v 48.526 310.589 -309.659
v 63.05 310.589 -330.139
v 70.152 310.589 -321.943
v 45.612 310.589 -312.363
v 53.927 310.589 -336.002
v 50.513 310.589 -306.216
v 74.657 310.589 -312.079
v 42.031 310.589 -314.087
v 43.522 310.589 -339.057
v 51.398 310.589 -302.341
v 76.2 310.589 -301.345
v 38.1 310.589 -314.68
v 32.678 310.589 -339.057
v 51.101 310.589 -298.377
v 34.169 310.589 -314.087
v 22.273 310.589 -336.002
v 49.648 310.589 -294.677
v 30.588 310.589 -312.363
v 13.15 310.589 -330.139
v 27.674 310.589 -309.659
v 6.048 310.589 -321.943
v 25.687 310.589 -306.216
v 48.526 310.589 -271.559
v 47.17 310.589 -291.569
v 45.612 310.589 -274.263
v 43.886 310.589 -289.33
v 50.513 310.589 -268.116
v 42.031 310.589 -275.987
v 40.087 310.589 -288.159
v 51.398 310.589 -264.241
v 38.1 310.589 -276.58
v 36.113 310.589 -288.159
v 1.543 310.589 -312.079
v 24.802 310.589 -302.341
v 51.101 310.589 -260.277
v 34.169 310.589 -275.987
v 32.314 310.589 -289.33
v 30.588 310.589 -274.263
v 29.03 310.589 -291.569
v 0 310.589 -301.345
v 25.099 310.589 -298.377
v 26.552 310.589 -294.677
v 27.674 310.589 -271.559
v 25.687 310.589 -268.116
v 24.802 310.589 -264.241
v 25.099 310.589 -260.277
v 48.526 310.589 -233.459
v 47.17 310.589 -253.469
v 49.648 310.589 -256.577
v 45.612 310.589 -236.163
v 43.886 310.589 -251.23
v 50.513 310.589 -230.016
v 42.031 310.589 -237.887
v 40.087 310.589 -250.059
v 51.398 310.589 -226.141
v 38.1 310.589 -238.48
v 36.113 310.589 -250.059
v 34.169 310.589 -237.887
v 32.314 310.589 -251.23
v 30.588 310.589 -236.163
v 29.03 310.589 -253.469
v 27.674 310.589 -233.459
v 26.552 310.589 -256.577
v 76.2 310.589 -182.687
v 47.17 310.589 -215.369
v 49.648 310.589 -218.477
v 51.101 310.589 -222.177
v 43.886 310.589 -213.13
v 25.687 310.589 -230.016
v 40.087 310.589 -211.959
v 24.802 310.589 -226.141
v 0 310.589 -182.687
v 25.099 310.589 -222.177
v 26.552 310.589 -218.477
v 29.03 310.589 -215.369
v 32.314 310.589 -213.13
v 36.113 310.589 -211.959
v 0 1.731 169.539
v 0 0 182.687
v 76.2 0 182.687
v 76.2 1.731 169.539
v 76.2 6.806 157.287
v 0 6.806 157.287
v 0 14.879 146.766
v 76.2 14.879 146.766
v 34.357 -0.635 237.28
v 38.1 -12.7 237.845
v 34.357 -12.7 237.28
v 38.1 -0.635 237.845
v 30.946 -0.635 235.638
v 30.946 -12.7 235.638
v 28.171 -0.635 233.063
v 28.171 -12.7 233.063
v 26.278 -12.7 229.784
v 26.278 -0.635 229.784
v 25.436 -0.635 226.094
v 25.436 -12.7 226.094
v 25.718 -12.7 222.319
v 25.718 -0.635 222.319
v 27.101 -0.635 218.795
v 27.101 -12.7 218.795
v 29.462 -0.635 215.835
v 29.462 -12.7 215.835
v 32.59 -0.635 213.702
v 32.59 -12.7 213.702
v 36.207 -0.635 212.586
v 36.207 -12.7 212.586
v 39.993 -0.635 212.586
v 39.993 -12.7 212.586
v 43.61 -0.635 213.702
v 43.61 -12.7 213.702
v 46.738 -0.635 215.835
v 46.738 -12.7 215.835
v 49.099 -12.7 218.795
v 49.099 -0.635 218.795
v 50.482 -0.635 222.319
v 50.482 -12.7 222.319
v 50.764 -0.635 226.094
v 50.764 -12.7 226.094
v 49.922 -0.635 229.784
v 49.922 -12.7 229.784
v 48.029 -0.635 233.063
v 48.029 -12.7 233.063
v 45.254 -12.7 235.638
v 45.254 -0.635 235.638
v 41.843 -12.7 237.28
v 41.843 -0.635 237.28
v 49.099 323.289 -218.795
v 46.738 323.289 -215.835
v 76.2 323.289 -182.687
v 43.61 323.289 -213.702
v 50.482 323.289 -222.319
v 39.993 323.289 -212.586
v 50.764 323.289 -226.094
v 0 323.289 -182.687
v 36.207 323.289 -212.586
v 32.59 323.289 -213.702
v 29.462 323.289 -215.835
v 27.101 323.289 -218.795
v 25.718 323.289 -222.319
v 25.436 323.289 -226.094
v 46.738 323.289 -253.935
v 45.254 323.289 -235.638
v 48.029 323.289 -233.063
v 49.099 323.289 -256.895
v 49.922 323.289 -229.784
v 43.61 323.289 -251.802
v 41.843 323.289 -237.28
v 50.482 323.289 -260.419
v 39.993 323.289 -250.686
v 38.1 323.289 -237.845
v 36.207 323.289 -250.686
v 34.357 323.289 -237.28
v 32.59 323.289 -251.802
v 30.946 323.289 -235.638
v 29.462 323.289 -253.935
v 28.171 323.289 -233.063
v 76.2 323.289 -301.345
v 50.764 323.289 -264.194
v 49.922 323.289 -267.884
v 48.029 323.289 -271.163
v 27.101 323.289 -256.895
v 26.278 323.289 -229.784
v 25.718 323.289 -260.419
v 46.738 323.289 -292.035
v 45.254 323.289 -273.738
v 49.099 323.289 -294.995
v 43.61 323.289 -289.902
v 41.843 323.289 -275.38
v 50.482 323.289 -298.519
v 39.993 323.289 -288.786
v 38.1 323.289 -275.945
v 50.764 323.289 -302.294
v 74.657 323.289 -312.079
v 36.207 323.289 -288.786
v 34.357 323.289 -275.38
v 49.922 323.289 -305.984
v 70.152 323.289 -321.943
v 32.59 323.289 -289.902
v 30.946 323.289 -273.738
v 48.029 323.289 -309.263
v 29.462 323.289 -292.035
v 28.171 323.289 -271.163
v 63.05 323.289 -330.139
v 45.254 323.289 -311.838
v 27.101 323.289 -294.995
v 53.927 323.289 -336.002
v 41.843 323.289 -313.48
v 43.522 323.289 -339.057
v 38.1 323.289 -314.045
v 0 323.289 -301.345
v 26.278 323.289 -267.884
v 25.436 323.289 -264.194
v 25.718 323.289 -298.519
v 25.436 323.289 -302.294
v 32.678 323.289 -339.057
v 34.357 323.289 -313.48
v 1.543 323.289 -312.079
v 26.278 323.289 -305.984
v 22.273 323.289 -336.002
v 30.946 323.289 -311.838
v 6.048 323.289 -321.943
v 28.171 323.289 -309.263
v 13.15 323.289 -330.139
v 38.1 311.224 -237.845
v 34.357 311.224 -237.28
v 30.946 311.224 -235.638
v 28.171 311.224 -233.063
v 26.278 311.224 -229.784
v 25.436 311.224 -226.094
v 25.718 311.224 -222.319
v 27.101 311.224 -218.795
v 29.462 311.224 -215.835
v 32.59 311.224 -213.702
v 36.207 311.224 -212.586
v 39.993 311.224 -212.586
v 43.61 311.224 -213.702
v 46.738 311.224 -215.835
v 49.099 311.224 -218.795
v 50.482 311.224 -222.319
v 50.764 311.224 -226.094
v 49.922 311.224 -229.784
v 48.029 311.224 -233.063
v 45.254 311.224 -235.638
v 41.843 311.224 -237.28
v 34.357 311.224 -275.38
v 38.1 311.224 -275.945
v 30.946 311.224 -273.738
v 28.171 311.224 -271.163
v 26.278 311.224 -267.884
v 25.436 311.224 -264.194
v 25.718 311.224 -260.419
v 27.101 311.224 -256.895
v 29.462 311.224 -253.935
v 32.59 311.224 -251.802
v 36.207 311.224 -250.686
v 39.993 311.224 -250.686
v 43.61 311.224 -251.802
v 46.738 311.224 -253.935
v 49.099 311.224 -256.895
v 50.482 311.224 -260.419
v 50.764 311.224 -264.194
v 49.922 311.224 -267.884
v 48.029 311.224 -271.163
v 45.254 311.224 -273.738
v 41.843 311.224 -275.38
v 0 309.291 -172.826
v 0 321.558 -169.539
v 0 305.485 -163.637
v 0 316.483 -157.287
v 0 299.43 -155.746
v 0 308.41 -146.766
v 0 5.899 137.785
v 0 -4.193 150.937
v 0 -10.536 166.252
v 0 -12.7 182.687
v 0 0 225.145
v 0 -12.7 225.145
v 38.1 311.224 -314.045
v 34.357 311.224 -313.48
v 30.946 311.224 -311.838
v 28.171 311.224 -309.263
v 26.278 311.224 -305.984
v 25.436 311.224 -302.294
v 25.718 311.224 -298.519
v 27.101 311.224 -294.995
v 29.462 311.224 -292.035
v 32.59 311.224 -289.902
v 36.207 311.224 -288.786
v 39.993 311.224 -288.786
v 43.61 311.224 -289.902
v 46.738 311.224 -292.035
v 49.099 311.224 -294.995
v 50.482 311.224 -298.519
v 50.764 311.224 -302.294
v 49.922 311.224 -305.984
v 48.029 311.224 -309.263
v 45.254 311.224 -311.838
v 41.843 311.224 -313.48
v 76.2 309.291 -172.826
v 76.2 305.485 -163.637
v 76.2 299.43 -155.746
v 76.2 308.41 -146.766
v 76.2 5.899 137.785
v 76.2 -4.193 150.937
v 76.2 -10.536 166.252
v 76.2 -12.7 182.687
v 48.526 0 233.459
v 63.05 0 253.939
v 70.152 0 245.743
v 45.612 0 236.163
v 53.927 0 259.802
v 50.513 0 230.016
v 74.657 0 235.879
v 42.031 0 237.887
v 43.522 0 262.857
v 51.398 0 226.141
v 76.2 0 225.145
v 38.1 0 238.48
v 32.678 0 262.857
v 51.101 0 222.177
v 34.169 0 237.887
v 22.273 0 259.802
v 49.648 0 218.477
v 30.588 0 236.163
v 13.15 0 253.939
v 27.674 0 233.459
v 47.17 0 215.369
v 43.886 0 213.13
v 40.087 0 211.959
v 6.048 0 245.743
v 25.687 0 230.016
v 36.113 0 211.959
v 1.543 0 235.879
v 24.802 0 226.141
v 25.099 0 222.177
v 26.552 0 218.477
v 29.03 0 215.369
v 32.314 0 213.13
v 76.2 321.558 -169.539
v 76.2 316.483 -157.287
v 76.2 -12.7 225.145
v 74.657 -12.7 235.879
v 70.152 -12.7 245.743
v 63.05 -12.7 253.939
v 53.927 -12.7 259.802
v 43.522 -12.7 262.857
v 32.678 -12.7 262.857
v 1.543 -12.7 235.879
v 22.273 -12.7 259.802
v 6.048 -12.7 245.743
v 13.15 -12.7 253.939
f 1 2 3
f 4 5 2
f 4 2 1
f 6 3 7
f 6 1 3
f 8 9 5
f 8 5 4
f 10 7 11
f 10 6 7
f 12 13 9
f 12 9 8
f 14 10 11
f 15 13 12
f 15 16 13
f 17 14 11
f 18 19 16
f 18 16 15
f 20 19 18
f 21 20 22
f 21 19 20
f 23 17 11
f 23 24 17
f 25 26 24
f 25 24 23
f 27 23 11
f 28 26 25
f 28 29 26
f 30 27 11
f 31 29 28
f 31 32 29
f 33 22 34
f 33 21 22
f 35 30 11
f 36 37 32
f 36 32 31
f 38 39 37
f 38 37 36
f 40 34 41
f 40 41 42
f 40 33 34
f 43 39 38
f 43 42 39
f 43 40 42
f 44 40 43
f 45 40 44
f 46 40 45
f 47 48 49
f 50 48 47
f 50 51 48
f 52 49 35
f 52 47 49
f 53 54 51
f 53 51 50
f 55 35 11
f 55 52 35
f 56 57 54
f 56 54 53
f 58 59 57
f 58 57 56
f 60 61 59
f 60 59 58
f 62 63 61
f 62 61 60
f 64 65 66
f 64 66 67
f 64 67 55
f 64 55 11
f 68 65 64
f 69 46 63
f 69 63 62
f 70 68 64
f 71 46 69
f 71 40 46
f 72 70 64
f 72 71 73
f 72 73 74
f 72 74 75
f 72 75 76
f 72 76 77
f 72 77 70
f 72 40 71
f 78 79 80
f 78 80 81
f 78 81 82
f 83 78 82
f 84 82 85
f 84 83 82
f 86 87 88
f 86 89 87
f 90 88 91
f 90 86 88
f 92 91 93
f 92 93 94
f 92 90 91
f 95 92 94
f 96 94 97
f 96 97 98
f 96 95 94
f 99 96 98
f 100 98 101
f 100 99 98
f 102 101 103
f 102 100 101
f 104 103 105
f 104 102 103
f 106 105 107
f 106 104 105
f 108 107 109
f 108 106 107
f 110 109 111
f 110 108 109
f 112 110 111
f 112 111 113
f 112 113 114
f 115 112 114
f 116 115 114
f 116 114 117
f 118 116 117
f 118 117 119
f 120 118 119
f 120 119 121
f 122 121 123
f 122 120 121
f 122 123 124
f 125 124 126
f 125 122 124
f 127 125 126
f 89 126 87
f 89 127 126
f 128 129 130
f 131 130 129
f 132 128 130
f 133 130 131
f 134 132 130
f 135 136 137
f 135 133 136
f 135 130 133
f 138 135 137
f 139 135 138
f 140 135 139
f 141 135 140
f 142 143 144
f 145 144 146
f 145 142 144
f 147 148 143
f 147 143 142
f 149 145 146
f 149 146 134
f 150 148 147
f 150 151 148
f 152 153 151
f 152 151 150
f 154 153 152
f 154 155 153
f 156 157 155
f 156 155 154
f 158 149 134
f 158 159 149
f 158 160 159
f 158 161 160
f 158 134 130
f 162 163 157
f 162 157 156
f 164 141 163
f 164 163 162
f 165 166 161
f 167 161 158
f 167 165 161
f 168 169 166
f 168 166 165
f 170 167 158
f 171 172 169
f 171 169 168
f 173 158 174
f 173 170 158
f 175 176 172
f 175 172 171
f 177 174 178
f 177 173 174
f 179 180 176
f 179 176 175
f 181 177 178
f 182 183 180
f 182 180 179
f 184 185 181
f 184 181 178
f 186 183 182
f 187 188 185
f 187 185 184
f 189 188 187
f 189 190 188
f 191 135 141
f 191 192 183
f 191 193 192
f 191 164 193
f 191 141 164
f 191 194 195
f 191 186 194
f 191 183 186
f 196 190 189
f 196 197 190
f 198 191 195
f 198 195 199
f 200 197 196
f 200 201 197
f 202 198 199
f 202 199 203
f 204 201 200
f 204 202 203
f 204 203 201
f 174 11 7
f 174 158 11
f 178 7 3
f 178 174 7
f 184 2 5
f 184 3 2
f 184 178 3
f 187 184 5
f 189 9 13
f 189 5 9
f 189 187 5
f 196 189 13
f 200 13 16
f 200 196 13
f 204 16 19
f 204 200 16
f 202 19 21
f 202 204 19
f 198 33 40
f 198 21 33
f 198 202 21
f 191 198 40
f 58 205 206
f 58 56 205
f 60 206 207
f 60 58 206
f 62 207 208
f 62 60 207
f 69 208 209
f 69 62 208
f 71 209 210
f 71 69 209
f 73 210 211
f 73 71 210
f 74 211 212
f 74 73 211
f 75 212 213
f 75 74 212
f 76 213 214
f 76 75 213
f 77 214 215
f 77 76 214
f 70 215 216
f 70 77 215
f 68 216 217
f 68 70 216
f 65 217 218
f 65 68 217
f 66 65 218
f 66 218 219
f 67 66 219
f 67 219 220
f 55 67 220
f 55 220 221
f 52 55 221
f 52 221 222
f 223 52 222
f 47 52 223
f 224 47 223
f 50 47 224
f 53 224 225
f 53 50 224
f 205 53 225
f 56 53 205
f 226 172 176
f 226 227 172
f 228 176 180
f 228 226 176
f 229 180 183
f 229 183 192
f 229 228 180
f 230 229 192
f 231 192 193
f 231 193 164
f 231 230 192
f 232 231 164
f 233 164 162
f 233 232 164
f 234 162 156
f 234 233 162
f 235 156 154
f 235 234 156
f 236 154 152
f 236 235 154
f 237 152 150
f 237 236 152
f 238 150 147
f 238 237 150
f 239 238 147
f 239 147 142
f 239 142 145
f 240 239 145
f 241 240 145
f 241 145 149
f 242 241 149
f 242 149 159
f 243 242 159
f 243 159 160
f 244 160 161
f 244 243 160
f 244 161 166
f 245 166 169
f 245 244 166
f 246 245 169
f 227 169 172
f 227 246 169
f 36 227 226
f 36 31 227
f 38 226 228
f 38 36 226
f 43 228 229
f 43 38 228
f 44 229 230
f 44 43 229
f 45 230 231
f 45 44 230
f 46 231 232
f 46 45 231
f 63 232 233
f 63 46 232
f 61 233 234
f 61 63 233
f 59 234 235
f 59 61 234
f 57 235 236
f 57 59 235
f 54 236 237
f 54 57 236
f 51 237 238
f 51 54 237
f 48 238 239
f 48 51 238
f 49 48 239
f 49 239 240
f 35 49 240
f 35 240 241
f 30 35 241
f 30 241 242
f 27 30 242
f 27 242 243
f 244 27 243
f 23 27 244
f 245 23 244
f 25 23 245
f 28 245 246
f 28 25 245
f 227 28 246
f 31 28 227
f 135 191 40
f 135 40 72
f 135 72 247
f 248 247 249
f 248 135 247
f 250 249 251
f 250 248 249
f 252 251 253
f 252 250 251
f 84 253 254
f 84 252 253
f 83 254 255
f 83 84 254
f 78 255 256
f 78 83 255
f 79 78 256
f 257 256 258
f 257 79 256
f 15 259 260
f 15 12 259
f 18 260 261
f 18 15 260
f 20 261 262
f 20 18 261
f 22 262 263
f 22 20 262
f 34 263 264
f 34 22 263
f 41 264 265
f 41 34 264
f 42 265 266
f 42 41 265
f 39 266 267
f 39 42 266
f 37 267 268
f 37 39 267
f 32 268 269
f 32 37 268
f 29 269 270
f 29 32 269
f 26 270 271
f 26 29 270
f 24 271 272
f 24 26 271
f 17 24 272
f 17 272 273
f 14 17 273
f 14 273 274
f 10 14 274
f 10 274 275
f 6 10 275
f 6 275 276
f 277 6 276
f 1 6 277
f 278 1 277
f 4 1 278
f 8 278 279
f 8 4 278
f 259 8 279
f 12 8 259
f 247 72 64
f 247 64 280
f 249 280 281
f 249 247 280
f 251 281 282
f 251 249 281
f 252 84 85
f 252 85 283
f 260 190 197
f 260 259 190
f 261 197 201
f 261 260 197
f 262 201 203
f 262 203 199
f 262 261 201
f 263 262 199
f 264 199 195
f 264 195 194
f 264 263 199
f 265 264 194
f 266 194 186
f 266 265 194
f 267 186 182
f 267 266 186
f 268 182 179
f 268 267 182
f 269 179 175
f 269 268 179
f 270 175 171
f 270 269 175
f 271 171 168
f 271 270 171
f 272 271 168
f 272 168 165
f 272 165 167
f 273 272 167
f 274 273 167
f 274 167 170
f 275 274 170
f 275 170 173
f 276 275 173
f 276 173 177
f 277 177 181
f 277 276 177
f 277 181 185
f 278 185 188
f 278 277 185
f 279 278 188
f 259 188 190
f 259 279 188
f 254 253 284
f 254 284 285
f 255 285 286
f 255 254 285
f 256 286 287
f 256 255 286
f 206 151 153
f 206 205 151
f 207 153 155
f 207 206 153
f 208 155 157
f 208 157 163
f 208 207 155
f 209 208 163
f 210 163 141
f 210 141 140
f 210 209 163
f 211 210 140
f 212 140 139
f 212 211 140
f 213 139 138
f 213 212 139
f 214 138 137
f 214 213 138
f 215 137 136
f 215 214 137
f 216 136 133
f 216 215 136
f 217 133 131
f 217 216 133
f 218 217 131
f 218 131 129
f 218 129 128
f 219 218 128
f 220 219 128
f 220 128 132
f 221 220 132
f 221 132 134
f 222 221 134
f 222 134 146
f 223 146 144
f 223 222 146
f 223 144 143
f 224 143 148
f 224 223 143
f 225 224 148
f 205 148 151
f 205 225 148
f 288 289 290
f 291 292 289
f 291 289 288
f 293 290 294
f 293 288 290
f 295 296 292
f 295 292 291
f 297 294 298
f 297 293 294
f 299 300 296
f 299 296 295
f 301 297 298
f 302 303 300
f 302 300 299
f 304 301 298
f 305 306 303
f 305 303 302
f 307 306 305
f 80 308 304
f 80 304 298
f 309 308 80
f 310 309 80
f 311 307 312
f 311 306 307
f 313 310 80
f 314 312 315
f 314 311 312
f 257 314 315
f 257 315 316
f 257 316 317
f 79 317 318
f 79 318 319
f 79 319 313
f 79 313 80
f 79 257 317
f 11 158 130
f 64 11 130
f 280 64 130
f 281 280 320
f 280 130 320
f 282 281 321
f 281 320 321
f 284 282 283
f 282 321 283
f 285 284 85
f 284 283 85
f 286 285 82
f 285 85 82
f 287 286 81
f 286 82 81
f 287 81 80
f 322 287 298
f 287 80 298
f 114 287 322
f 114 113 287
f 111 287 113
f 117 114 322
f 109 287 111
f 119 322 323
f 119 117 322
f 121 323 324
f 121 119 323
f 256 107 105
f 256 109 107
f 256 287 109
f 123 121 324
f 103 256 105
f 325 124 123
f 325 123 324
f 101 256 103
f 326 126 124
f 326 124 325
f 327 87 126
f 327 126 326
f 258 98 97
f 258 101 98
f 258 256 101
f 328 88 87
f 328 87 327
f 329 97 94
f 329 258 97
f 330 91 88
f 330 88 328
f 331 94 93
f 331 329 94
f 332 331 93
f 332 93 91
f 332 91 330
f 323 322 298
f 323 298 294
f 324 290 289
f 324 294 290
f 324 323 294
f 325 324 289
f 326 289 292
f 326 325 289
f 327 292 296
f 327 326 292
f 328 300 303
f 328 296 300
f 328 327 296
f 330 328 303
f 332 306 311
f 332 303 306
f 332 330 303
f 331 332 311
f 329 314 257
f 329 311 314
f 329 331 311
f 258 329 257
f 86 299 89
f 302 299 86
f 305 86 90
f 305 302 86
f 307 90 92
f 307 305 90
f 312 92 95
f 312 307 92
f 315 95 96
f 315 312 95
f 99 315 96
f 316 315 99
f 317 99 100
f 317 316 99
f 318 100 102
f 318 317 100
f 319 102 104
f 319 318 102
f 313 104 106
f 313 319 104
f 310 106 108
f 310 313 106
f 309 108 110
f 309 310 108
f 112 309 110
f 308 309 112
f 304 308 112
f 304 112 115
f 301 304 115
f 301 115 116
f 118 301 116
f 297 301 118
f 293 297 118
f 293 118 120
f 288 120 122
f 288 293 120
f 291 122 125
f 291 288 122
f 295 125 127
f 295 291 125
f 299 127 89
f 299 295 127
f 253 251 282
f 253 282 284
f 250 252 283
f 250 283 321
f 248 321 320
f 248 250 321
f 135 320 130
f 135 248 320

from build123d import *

# Parameters (mm, degrees)
BOSS_EXTRUDE1_DEPTH = 76.2
FILLET1_RADIUS      = 38.1
FILLET1_LENGTH      = 12.7
FILLET2_RADIUS      = 38.1
FILLET2_LENGTH      = 12.7
LPATTERN1_COUNT     = 3
LPATTERN1_PITCH     = 38.1


with BuildPart() as part:
    # Sketch2 → Boss-Extrude1 (new body)
    with BuildSketch(Plane(origin=(0, 0, 0), x_dir=(0, 0, -1), z_dir=(1, 0, 0))):
        with BuildLine():
            Line((-263.244610179, 0), (-182.686659148, 0))
            ThreePointArc((-182.686659148, 0), (-163.246340784, 3.866919748), (-146.765634664, 14.878975516))
            Line((-146.765634664, 14.878975516), (146.765634664, 308.410244843))
            ThreePointArc((146.765634664, 308.410244843), (163.246340784, 319.42230061), (182.686659148, 323.289220358))
            Line((182.686659148, 323.289220358), (339.444610179, 323.289220358))
            Line((339.444610179, 323.289220358), (339.444610179, 310.589220358))
            Line((339.444610179, 310.589220358), (182.686659148, 310.589220358))
            ThreePointArc((182.686659148, 310.589220358), (168.106420375, 307.689030547), (155.745890785, 299.429988722))
            Line((155.745890785, 299.429988722), (-137.785378542, 5.898719395))
            ThreePointArc((-137.785378542, 5.898719395), (-158.386261193, -7.866350314), (-182.686659148, -12.7))
            Line((-182.686659148, -12.7), (-263.244610179, -12.7))
            Line((-263.244610179, -12.7), (-263.244610179, 0))
        make_face()
    extrude(amount=BOSS_EXTRUDE1_DEPTH)

    # Fillet1: full round fillet: the end face becomes a half cylinder, R = half its width
    fillet1_face = Plane((38.1, -6.35, 263.244610179), x_dir=(0, -1, 0), z_dir=(0, 0, 1))  # on the end face: x along it, z out of the body
    fillet1_slab = fillet1_face.offset(-FILLET1_RADIUS / 2) * Box(FILLET1_LENGTH, 2 * FILLET1_RADIUS, FILLET1_RADIUS, mode=Mode.PRIVATE)  # the body's end, R deep
    fillet1_round = Plane((38.1, -6.35, 225.144610179), x_dir=(0, 0, 1), z_dir=(0, -1, 0)) * Cylinder(FILLET1_RADIUS, FILLET1_LENGTH, mode=Mode.PRIVATE)  # its axis R under the face
    add(fillet1_slab - fillet1_round, mode=Mode.SUBTRACT)

    # Fillet2: full round fillet: the end face becomes a half cylinder, R = half its width
    fillet2_face = Plane((38.1, 316.939220358, -339.444610179), x_dir=(0, 1, 0), z_dir=(0, 0, -1))  # on the end face: x along it, z out of the body
    fillet2_slab = fillet2_face.offset(-FILLET2_RADIUS / 2) * Box(FILLET2_LENGTH, 2 * FILLET2_RADIUS, FILLET2_RADIUS, mode=Mode.PRIVATE)  # the body's end, R deep
    fillet2_round = Plane((38.1, 316.939220358, -301.344610179), x_dir=(0, 0, -1), z_dir=(0, 1, 0)) * Cylinder(FILLET2_RADIUS, FILLET2_LENGTH, mode=Mode.PRIVATE)  # its axis R under the face
    add(fillet2_slab - fillet2_round, mode=Mode.SUBTRACT)

    # Sketch4 → 1 (1) Diameter Hole1 (revolve, cut)
    with BuildSketch(Plane(origin=(38.1, 0, 225.144610179), x_dir=(0, 0, 1), z_dir=(1, 0, 0))):
        Polygon((0, 0), (0, 12.7), (12.7, 12.7), (12.7, 0.635), (13.335, 0), align=None)
    revolve(axis=Axis((38.1, 6.35, 225.144610179), (0, -1, 0)), mode=Mode.SUBTRACT)

    # Sketch7 → 1 (1) Diameter Hole2 (revolve, cut)
    with BuildSketch(Plane(origin=(38.1, 310.589220358, -301.344610179), x_dir=(0, 0, -1), z_dir=(1, 0, 0))):
        Polygon((0, 0), (0, 12.7), (12.7, 12.7), (12.7, 0.635), (13.335, 0), align=None)
    f_1_1_diameter_hole2 = revolve(axis=Axis((38.1, 304.239220358, -301.344610179), (0, 1, 0)), mode=Mode.SUBTRACT)

    # LPattern1: 1 (1) Diameter Hole2 ×3
    with Locations(*[(0, 0, i * LPATTERN1_PITCH) for i in range(1, LPATTERN1_COUNT)]):
        add(f_1_1_diameter_hole2, mode=Mode.SUBTRACT)


solid = part.part
